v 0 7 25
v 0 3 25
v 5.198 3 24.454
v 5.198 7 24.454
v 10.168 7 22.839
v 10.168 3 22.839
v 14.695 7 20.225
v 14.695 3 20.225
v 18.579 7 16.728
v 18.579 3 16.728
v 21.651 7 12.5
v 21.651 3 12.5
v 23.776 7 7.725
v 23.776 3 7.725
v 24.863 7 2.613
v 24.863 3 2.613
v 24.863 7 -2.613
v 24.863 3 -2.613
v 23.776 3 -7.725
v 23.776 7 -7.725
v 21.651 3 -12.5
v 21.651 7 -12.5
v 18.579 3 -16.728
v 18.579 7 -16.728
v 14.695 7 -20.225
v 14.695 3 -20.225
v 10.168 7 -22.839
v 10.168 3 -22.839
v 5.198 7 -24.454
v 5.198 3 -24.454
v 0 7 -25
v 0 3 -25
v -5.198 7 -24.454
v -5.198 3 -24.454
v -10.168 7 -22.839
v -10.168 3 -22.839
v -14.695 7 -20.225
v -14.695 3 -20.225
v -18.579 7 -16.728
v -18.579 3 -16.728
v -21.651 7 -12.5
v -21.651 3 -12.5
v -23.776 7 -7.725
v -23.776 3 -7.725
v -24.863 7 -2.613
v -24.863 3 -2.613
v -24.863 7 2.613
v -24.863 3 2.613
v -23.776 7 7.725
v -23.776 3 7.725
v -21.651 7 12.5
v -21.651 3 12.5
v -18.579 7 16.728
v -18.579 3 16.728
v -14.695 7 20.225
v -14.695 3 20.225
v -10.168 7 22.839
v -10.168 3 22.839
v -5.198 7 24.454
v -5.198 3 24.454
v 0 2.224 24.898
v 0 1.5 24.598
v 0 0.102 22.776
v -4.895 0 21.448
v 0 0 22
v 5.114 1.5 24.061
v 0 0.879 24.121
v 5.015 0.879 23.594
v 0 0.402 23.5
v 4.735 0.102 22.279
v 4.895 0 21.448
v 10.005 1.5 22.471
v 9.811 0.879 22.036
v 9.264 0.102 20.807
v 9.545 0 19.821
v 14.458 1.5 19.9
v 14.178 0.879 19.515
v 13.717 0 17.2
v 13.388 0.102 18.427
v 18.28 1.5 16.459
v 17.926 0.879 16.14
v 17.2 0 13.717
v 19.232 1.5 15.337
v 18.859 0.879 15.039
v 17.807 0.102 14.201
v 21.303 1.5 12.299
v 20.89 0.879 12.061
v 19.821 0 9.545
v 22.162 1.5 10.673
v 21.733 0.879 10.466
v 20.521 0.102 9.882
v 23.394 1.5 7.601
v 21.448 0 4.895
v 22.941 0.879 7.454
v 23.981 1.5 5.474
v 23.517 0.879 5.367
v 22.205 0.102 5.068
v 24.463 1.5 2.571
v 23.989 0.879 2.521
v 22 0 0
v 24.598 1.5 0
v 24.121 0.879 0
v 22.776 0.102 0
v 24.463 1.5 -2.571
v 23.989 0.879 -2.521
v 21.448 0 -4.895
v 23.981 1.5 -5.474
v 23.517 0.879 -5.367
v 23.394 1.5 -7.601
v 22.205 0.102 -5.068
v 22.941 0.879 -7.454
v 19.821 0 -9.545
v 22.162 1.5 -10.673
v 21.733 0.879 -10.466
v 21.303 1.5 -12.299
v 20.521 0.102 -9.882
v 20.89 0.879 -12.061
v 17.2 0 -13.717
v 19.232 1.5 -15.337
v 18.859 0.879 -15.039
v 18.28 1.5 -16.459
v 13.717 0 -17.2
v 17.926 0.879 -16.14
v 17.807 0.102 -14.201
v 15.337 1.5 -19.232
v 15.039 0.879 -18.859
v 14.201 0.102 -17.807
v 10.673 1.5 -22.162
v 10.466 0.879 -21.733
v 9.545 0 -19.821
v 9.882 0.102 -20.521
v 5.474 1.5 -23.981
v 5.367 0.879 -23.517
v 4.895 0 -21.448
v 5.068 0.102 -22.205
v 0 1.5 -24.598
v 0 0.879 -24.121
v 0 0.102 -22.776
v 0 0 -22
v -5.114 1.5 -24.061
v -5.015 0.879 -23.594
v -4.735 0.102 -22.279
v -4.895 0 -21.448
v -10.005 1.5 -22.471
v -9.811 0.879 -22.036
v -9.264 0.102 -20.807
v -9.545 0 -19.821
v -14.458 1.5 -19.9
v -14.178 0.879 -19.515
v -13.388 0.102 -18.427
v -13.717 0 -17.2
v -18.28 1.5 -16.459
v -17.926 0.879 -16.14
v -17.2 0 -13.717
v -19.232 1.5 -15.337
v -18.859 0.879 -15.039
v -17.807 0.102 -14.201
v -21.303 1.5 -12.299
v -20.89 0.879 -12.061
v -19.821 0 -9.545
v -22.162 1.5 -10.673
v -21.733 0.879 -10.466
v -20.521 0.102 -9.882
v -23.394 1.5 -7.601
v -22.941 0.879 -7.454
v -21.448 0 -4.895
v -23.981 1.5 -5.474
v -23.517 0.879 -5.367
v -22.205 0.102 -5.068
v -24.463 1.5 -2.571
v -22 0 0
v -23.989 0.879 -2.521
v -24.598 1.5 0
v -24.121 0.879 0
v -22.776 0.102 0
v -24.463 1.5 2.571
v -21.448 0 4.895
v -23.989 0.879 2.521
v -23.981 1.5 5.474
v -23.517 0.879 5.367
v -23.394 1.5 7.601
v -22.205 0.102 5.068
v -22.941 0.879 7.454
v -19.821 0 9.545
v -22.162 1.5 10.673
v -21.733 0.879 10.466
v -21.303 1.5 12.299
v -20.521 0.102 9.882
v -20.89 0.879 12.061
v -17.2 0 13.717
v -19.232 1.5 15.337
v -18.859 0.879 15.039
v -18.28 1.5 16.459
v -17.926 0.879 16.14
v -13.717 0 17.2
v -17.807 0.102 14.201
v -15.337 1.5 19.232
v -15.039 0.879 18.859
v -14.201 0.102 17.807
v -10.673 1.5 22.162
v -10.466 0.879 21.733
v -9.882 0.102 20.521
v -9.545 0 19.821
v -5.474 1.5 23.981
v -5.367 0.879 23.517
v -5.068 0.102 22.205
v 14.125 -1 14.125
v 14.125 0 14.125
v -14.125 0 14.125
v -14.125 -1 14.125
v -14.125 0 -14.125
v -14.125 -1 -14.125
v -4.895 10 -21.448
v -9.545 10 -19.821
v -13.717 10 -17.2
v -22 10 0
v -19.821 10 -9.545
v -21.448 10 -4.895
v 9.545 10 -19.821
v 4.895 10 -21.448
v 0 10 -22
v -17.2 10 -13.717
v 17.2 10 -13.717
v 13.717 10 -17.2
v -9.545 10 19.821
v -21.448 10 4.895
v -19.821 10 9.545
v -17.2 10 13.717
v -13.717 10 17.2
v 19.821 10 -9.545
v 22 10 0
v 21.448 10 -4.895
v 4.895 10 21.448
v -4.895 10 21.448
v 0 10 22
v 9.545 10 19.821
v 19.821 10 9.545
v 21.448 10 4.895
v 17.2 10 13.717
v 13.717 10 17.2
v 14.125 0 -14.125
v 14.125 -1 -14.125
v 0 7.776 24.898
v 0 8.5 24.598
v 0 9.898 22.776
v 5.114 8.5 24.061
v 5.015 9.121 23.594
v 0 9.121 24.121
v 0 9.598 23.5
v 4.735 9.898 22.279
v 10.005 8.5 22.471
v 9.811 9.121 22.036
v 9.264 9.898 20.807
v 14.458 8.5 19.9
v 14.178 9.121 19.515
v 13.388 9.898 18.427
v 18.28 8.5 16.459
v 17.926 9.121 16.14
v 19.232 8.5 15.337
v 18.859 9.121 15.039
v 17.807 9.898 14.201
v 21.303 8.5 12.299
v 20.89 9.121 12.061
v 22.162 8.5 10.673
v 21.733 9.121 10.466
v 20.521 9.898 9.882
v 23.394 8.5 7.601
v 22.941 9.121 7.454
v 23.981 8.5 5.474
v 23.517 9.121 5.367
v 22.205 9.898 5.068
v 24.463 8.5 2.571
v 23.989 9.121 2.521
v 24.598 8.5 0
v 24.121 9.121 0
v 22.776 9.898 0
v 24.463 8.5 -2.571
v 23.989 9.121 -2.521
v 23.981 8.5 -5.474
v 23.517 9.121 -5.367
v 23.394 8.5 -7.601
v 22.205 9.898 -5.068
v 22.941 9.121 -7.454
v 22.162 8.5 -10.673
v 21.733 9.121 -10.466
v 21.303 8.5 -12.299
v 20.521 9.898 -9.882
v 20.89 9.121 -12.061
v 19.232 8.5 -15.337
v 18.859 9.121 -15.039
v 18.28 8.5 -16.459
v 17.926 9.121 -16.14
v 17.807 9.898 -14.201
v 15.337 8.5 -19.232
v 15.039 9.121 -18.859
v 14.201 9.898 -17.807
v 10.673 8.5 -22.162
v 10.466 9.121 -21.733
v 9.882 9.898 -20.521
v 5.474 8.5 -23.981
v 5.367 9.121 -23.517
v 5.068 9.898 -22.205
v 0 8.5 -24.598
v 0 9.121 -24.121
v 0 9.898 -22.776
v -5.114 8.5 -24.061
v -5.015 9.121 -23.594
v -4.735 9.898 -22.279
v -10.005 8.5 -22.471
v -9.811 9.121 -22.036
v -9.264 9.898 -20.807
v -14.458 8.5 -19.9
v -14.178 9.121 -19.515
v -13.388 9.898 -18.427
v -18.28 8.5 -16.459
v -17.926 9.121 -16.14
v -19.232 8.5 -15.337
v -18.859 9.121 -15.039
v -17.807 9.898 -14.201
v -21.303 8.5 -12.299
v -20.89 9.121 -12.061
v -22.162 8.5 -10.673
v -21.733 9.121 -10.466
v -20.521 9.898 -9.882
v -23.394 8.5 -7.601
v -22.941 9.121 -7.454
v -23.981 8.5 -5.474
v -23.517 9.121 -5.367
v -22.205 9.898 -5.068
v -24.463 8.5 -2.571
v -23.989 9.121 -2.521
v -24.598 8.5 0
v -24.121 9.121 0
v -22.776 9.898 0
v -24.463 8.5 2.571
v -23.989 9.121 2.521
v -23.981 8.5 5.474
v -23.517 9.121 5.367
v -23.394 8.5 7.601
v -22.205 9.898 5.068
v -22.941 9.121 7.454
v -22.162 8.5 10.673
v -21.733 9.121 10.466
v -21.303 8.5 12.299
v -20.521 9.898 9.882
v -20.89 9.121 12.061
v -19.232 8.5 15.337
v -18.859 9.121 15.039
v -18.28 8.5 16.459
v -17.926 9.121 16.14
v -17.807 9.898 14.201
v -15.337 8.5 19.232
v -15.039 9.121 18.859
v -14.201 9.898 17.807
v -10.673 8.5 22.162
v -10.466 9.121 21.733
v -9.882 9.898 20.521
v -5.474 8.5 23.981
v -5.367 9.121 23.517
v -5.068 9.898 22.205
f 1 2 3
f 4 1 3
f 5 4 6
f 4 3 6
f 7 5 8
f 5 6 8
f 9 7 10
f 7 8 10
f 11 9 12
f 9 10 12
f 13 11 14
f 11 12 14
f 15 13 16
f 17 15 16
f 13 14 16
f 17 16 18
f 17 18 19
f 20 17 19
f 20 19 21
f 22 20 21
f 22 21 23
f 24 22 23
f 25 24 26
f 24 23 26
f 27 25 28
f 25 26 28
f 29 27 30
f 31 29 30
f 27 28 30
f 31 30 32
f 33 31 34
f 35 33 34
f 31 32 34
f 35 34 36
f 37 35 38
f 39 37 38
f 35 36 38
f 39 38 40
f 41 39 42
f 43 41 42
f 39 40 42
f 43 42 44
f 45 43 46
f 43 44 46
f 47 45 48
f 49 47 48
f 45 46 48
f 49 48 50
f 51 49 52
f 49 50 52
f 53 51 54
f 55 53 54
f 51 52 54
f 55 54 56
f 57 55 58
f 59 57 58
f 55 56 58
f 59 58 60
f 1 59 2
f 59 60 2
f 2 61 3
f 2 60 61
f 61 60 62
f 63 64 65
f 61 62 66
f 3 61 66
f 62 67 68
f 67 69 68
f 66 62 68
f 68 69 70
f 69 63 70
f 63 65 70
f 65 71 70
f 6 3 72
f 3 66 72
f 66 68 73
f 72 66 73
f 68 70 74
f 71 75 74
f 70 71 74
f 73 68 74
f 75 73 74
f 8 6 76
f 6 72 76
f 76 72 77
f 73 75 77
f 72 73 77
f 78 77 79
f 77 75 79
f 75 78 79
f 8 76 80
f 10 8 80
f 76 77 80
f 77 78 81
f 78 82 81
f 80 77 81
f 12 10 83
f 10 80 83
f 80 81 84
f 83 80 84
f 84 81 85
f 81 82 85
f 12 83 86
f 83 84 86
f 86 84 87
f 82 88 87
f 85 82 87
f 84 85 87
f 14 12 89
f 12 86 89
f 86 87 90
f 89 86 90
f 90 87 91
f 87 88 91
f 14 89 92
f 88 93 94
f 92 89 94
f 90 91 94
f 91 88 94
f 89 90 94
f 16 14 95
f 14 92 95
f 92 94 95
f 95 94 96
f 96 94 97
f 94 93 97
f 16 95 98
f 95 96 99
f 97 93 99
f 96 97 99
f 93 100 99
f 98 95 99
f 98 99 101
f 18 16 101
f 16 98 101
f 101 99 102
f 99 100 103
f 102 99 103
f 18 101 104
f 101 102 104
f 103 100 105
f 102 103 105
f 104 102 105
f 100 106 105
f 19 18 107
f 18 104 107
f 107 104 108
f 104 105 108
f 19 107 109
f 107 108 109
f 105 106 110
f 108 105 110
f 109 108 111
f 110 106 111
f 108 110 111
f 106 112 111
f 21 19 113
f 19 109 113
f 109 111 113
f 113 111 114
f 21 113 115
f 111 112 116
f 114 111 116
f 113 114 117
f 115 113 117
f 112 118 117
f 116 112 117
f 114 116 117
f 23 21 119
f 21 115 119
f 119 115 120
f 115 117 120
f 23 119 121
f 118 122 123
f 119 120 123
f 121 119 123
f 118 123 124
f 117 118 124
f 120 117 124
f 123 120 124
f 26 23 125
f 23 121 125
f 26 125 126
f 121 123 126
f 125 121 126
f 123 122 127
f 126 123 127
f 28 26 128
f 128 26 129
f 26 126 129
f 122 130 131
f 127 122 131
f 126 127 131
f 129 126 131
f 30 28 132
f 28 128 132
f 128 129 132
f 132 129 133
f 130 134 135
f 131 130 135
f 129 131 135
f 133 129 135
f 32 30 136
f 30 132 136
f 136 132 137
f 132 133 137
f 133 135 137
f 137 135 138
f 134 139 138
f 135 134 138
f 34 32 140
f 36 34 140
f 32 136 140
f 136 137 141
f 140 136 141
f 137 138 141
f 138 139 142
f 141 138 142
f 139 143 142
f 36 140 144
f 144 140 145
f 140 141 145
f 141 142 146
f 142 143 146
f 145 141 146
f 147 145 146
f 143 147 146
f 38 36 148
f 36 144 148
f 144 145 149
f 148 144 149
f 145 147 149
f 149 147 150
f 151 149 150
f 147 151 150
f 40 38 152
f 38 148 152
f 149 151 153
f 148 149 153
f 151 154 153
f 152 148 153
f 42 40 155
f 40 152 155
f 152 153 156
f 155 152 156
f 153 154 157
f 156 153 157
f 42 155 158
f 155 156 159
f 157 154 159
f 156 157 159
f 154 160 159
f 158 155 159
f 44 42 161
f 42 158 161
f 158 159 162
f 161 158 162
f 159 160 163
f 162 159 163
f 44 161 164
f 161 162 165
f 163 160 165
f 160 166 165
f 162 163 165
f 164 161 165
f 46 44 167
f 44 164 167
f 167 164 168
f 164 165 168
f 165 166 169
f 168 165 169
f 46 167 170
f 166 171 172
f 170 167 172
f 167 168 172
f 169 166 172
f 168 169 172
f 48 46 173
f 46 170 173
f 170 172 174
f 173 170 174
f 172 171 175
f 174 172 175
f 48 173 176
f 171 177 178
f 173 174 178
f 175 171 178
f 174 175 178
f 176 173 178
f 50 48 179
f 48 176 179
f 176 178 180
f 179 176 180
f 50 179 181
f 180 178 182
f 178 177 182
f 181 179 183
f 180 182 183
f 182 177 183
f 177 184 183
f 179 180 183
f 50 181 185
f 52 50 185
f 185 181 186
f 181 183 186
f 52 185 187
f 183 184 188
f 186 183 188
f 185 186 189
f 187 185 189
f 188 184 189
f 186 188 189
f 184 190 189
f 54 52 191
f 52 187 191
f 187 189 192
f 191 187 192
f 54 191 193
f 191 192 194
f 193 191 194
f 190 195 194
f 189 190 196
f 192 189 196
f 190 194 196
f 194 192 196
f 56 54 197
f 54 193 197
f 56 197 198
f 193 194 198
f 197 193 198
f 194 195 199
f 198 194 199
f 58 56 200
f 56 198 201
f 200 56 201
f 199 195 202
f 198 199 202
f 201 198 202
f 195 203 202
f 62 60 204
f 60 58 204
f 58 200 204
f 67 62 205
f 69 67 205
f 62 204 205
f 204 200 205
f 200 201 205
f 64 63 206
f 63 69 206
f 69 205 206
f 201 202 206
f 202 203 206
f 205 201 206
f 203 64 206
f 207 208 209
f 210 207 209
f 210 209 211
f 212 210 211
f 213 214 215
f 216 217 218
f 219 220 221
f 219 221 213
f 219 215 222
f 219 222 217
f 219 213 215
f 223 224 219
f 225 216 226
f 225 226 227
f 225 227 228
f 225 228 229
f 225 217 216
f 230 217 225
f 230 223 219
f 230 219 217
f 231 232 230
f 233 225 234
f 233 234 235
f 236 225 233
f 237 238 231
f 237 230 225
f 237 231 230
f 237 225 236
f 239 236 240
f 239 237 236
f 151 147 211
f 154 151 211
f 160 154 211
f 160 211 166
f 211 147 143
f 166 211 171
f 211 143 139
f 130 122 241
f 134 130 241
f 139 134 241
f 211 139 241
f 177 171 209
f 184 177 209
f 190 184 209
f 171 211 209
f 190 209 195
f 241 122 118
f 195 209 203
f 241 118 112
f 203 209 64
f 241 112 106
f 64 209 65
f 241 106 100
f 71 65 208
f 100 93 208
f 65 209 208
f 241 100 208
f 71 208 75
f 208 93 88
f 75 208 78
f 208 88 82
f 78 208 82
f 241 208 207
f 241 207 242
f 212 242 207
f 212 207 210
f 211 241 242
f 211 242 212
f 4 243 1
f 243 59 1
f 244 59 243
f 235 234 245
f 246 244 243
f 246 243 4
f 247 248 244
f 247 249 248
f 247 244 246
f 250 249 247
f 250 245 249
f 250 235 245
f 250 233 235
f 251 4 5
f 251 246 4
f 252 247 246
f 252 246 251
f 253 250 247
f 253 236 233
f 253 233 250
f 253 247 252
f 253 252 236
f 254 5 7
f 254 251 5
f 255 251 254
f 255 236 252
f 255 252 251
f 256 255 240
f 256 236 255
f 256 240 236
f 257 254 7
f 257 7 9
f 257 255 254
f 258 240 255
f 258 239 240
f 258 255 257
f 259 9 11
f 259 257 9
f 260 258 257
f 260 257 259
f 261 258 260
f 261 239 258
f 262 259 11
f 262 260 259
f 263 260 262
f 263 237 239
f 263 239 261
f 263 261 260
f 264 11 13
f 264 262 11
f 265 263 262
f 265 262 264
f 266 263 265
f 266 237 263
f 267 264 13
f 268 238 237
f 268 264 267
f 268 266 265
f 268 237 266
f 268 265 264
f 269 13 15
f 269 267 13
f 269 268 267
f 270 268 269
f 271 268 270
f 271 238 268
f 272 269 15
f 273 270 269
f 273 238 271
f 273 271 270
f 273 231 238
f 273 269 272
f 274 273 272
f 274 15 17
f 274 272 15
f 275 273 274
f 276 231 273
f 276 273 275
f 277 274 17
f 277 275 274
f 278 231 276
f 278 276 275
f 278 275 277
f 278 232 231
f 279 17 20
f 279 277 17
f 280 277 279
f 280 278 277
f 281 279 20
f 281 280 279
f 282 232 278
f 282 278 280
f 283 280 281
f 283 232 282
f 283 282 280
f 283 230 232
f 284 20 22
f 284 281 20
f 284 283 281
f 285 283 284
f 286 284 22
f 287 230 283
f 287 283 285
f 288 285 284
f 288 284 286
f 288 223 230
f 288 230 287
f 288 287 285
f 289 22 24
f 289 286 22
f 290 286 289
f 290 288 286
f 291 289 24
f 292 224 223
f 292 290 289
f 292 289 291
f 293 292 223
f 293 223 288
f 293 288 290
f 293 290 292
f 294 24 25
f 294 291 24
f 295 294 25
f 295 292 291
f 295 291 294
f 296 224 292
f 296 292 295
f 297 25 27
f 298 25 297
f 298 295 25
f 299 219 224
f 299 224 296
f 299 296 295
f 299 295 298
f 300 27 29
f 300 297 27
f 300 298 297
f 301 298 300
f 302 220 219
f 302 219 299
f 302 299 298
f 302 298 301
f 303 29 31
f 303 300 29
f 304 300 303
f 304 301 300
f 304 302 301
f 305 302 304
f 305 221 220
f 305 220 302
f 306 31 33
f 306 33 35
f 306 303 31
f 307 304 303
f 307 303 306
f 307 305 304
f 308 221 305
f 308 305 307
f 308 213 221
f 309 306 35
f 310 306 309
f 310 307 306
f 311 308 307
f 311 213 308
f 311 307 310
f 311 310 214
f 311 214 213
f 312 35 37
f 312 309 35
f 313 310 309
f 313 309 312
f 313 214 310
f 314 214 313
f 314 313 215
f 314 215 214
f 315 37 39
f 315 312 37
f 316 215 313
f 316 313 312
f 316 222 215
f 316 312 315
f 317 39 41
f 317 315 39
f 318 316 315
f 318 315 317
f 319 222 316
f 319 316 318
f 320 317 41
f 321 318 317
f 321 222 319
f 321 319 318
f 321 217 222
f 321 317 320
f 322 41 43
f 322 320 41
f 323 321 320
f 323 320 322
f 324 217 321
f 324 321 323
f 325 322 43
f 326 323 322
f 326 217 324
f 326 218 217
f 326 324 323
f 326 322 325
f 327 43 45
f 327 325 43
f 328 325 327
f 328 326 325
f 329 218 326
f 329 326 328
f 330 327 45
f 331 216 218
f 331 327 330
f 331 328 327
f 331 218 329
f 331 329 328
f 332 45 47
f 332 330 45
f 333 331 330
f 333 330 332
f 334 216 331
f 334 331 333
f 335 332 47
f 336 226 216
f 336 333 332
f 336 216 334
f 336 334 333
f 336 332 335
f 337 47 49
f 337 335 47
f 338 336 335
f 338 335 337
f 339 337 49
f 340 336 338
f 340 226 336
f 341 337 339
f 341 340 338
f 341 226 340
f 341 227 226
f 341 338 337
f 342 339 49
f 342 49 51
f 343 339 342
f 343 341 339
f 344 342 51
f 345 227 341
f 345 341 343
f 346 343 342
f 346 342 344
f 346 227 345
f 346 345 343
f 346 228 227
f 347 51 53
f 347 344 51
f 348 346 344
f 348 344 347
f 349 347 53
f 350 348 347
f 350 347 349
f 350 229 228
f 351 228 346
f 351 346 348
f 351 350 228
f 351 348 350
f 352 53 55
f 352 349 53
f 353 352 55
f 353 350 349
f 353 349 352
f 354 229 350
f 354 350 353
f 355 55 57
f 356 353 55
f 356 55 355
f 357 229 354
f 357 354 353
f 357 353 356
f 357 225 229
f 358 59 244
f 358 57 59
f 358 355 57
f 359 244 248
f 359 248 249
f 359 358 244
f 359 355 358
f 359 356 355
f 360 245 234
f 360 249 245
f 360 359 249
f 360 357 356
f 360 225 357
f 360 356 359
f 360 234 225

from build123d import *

# Parameters (mm, degrees)
SKETCH2_R           = 25
BOSS_EXTRUDE1_DEPTH = 10
FILLET1_R           = 3
SKETCH3_W           = 28.25
SKETCH3_H           = 28.25
BOSS_EXTRUDE2_DEPTH = 1


with BuildPart() as part:
    # Sketch2 → Boss-Extrude1 (new body)
    with BuildSketch(Plane(origin=(0, 0, 0), x_dir=(1, 0, 0), z_dir=(0, 1, 0))):
        with Locations(Location((0, 0, 0), (0, 0, 270))):
            Circle(SKETCH2_R)
    extrude(amount=BOSS_EXTRUDE1_DEPTH)

    # Fillet1
    fillet1_edges = [part.edges().sort_by_distance(p)[0] for p in [
        (0, 0, -25),
        (0, 10, -25),
    ]]
    fillet(fillet1_edges, radius=FILLET1_R)

    # Sketch3 → Boss-Extrude2 (add)
    with BuildSketch(Plane(origin=(0, 0, 0), x_dir=(-1, 0, 0), z_dir=(0, -1, 0))):
        Rectangle(SKETCH3_W, SKETCH3_H)
    extrude(amount=BOSS_EXTRUDE2_DEPTH)


solid = part.part
